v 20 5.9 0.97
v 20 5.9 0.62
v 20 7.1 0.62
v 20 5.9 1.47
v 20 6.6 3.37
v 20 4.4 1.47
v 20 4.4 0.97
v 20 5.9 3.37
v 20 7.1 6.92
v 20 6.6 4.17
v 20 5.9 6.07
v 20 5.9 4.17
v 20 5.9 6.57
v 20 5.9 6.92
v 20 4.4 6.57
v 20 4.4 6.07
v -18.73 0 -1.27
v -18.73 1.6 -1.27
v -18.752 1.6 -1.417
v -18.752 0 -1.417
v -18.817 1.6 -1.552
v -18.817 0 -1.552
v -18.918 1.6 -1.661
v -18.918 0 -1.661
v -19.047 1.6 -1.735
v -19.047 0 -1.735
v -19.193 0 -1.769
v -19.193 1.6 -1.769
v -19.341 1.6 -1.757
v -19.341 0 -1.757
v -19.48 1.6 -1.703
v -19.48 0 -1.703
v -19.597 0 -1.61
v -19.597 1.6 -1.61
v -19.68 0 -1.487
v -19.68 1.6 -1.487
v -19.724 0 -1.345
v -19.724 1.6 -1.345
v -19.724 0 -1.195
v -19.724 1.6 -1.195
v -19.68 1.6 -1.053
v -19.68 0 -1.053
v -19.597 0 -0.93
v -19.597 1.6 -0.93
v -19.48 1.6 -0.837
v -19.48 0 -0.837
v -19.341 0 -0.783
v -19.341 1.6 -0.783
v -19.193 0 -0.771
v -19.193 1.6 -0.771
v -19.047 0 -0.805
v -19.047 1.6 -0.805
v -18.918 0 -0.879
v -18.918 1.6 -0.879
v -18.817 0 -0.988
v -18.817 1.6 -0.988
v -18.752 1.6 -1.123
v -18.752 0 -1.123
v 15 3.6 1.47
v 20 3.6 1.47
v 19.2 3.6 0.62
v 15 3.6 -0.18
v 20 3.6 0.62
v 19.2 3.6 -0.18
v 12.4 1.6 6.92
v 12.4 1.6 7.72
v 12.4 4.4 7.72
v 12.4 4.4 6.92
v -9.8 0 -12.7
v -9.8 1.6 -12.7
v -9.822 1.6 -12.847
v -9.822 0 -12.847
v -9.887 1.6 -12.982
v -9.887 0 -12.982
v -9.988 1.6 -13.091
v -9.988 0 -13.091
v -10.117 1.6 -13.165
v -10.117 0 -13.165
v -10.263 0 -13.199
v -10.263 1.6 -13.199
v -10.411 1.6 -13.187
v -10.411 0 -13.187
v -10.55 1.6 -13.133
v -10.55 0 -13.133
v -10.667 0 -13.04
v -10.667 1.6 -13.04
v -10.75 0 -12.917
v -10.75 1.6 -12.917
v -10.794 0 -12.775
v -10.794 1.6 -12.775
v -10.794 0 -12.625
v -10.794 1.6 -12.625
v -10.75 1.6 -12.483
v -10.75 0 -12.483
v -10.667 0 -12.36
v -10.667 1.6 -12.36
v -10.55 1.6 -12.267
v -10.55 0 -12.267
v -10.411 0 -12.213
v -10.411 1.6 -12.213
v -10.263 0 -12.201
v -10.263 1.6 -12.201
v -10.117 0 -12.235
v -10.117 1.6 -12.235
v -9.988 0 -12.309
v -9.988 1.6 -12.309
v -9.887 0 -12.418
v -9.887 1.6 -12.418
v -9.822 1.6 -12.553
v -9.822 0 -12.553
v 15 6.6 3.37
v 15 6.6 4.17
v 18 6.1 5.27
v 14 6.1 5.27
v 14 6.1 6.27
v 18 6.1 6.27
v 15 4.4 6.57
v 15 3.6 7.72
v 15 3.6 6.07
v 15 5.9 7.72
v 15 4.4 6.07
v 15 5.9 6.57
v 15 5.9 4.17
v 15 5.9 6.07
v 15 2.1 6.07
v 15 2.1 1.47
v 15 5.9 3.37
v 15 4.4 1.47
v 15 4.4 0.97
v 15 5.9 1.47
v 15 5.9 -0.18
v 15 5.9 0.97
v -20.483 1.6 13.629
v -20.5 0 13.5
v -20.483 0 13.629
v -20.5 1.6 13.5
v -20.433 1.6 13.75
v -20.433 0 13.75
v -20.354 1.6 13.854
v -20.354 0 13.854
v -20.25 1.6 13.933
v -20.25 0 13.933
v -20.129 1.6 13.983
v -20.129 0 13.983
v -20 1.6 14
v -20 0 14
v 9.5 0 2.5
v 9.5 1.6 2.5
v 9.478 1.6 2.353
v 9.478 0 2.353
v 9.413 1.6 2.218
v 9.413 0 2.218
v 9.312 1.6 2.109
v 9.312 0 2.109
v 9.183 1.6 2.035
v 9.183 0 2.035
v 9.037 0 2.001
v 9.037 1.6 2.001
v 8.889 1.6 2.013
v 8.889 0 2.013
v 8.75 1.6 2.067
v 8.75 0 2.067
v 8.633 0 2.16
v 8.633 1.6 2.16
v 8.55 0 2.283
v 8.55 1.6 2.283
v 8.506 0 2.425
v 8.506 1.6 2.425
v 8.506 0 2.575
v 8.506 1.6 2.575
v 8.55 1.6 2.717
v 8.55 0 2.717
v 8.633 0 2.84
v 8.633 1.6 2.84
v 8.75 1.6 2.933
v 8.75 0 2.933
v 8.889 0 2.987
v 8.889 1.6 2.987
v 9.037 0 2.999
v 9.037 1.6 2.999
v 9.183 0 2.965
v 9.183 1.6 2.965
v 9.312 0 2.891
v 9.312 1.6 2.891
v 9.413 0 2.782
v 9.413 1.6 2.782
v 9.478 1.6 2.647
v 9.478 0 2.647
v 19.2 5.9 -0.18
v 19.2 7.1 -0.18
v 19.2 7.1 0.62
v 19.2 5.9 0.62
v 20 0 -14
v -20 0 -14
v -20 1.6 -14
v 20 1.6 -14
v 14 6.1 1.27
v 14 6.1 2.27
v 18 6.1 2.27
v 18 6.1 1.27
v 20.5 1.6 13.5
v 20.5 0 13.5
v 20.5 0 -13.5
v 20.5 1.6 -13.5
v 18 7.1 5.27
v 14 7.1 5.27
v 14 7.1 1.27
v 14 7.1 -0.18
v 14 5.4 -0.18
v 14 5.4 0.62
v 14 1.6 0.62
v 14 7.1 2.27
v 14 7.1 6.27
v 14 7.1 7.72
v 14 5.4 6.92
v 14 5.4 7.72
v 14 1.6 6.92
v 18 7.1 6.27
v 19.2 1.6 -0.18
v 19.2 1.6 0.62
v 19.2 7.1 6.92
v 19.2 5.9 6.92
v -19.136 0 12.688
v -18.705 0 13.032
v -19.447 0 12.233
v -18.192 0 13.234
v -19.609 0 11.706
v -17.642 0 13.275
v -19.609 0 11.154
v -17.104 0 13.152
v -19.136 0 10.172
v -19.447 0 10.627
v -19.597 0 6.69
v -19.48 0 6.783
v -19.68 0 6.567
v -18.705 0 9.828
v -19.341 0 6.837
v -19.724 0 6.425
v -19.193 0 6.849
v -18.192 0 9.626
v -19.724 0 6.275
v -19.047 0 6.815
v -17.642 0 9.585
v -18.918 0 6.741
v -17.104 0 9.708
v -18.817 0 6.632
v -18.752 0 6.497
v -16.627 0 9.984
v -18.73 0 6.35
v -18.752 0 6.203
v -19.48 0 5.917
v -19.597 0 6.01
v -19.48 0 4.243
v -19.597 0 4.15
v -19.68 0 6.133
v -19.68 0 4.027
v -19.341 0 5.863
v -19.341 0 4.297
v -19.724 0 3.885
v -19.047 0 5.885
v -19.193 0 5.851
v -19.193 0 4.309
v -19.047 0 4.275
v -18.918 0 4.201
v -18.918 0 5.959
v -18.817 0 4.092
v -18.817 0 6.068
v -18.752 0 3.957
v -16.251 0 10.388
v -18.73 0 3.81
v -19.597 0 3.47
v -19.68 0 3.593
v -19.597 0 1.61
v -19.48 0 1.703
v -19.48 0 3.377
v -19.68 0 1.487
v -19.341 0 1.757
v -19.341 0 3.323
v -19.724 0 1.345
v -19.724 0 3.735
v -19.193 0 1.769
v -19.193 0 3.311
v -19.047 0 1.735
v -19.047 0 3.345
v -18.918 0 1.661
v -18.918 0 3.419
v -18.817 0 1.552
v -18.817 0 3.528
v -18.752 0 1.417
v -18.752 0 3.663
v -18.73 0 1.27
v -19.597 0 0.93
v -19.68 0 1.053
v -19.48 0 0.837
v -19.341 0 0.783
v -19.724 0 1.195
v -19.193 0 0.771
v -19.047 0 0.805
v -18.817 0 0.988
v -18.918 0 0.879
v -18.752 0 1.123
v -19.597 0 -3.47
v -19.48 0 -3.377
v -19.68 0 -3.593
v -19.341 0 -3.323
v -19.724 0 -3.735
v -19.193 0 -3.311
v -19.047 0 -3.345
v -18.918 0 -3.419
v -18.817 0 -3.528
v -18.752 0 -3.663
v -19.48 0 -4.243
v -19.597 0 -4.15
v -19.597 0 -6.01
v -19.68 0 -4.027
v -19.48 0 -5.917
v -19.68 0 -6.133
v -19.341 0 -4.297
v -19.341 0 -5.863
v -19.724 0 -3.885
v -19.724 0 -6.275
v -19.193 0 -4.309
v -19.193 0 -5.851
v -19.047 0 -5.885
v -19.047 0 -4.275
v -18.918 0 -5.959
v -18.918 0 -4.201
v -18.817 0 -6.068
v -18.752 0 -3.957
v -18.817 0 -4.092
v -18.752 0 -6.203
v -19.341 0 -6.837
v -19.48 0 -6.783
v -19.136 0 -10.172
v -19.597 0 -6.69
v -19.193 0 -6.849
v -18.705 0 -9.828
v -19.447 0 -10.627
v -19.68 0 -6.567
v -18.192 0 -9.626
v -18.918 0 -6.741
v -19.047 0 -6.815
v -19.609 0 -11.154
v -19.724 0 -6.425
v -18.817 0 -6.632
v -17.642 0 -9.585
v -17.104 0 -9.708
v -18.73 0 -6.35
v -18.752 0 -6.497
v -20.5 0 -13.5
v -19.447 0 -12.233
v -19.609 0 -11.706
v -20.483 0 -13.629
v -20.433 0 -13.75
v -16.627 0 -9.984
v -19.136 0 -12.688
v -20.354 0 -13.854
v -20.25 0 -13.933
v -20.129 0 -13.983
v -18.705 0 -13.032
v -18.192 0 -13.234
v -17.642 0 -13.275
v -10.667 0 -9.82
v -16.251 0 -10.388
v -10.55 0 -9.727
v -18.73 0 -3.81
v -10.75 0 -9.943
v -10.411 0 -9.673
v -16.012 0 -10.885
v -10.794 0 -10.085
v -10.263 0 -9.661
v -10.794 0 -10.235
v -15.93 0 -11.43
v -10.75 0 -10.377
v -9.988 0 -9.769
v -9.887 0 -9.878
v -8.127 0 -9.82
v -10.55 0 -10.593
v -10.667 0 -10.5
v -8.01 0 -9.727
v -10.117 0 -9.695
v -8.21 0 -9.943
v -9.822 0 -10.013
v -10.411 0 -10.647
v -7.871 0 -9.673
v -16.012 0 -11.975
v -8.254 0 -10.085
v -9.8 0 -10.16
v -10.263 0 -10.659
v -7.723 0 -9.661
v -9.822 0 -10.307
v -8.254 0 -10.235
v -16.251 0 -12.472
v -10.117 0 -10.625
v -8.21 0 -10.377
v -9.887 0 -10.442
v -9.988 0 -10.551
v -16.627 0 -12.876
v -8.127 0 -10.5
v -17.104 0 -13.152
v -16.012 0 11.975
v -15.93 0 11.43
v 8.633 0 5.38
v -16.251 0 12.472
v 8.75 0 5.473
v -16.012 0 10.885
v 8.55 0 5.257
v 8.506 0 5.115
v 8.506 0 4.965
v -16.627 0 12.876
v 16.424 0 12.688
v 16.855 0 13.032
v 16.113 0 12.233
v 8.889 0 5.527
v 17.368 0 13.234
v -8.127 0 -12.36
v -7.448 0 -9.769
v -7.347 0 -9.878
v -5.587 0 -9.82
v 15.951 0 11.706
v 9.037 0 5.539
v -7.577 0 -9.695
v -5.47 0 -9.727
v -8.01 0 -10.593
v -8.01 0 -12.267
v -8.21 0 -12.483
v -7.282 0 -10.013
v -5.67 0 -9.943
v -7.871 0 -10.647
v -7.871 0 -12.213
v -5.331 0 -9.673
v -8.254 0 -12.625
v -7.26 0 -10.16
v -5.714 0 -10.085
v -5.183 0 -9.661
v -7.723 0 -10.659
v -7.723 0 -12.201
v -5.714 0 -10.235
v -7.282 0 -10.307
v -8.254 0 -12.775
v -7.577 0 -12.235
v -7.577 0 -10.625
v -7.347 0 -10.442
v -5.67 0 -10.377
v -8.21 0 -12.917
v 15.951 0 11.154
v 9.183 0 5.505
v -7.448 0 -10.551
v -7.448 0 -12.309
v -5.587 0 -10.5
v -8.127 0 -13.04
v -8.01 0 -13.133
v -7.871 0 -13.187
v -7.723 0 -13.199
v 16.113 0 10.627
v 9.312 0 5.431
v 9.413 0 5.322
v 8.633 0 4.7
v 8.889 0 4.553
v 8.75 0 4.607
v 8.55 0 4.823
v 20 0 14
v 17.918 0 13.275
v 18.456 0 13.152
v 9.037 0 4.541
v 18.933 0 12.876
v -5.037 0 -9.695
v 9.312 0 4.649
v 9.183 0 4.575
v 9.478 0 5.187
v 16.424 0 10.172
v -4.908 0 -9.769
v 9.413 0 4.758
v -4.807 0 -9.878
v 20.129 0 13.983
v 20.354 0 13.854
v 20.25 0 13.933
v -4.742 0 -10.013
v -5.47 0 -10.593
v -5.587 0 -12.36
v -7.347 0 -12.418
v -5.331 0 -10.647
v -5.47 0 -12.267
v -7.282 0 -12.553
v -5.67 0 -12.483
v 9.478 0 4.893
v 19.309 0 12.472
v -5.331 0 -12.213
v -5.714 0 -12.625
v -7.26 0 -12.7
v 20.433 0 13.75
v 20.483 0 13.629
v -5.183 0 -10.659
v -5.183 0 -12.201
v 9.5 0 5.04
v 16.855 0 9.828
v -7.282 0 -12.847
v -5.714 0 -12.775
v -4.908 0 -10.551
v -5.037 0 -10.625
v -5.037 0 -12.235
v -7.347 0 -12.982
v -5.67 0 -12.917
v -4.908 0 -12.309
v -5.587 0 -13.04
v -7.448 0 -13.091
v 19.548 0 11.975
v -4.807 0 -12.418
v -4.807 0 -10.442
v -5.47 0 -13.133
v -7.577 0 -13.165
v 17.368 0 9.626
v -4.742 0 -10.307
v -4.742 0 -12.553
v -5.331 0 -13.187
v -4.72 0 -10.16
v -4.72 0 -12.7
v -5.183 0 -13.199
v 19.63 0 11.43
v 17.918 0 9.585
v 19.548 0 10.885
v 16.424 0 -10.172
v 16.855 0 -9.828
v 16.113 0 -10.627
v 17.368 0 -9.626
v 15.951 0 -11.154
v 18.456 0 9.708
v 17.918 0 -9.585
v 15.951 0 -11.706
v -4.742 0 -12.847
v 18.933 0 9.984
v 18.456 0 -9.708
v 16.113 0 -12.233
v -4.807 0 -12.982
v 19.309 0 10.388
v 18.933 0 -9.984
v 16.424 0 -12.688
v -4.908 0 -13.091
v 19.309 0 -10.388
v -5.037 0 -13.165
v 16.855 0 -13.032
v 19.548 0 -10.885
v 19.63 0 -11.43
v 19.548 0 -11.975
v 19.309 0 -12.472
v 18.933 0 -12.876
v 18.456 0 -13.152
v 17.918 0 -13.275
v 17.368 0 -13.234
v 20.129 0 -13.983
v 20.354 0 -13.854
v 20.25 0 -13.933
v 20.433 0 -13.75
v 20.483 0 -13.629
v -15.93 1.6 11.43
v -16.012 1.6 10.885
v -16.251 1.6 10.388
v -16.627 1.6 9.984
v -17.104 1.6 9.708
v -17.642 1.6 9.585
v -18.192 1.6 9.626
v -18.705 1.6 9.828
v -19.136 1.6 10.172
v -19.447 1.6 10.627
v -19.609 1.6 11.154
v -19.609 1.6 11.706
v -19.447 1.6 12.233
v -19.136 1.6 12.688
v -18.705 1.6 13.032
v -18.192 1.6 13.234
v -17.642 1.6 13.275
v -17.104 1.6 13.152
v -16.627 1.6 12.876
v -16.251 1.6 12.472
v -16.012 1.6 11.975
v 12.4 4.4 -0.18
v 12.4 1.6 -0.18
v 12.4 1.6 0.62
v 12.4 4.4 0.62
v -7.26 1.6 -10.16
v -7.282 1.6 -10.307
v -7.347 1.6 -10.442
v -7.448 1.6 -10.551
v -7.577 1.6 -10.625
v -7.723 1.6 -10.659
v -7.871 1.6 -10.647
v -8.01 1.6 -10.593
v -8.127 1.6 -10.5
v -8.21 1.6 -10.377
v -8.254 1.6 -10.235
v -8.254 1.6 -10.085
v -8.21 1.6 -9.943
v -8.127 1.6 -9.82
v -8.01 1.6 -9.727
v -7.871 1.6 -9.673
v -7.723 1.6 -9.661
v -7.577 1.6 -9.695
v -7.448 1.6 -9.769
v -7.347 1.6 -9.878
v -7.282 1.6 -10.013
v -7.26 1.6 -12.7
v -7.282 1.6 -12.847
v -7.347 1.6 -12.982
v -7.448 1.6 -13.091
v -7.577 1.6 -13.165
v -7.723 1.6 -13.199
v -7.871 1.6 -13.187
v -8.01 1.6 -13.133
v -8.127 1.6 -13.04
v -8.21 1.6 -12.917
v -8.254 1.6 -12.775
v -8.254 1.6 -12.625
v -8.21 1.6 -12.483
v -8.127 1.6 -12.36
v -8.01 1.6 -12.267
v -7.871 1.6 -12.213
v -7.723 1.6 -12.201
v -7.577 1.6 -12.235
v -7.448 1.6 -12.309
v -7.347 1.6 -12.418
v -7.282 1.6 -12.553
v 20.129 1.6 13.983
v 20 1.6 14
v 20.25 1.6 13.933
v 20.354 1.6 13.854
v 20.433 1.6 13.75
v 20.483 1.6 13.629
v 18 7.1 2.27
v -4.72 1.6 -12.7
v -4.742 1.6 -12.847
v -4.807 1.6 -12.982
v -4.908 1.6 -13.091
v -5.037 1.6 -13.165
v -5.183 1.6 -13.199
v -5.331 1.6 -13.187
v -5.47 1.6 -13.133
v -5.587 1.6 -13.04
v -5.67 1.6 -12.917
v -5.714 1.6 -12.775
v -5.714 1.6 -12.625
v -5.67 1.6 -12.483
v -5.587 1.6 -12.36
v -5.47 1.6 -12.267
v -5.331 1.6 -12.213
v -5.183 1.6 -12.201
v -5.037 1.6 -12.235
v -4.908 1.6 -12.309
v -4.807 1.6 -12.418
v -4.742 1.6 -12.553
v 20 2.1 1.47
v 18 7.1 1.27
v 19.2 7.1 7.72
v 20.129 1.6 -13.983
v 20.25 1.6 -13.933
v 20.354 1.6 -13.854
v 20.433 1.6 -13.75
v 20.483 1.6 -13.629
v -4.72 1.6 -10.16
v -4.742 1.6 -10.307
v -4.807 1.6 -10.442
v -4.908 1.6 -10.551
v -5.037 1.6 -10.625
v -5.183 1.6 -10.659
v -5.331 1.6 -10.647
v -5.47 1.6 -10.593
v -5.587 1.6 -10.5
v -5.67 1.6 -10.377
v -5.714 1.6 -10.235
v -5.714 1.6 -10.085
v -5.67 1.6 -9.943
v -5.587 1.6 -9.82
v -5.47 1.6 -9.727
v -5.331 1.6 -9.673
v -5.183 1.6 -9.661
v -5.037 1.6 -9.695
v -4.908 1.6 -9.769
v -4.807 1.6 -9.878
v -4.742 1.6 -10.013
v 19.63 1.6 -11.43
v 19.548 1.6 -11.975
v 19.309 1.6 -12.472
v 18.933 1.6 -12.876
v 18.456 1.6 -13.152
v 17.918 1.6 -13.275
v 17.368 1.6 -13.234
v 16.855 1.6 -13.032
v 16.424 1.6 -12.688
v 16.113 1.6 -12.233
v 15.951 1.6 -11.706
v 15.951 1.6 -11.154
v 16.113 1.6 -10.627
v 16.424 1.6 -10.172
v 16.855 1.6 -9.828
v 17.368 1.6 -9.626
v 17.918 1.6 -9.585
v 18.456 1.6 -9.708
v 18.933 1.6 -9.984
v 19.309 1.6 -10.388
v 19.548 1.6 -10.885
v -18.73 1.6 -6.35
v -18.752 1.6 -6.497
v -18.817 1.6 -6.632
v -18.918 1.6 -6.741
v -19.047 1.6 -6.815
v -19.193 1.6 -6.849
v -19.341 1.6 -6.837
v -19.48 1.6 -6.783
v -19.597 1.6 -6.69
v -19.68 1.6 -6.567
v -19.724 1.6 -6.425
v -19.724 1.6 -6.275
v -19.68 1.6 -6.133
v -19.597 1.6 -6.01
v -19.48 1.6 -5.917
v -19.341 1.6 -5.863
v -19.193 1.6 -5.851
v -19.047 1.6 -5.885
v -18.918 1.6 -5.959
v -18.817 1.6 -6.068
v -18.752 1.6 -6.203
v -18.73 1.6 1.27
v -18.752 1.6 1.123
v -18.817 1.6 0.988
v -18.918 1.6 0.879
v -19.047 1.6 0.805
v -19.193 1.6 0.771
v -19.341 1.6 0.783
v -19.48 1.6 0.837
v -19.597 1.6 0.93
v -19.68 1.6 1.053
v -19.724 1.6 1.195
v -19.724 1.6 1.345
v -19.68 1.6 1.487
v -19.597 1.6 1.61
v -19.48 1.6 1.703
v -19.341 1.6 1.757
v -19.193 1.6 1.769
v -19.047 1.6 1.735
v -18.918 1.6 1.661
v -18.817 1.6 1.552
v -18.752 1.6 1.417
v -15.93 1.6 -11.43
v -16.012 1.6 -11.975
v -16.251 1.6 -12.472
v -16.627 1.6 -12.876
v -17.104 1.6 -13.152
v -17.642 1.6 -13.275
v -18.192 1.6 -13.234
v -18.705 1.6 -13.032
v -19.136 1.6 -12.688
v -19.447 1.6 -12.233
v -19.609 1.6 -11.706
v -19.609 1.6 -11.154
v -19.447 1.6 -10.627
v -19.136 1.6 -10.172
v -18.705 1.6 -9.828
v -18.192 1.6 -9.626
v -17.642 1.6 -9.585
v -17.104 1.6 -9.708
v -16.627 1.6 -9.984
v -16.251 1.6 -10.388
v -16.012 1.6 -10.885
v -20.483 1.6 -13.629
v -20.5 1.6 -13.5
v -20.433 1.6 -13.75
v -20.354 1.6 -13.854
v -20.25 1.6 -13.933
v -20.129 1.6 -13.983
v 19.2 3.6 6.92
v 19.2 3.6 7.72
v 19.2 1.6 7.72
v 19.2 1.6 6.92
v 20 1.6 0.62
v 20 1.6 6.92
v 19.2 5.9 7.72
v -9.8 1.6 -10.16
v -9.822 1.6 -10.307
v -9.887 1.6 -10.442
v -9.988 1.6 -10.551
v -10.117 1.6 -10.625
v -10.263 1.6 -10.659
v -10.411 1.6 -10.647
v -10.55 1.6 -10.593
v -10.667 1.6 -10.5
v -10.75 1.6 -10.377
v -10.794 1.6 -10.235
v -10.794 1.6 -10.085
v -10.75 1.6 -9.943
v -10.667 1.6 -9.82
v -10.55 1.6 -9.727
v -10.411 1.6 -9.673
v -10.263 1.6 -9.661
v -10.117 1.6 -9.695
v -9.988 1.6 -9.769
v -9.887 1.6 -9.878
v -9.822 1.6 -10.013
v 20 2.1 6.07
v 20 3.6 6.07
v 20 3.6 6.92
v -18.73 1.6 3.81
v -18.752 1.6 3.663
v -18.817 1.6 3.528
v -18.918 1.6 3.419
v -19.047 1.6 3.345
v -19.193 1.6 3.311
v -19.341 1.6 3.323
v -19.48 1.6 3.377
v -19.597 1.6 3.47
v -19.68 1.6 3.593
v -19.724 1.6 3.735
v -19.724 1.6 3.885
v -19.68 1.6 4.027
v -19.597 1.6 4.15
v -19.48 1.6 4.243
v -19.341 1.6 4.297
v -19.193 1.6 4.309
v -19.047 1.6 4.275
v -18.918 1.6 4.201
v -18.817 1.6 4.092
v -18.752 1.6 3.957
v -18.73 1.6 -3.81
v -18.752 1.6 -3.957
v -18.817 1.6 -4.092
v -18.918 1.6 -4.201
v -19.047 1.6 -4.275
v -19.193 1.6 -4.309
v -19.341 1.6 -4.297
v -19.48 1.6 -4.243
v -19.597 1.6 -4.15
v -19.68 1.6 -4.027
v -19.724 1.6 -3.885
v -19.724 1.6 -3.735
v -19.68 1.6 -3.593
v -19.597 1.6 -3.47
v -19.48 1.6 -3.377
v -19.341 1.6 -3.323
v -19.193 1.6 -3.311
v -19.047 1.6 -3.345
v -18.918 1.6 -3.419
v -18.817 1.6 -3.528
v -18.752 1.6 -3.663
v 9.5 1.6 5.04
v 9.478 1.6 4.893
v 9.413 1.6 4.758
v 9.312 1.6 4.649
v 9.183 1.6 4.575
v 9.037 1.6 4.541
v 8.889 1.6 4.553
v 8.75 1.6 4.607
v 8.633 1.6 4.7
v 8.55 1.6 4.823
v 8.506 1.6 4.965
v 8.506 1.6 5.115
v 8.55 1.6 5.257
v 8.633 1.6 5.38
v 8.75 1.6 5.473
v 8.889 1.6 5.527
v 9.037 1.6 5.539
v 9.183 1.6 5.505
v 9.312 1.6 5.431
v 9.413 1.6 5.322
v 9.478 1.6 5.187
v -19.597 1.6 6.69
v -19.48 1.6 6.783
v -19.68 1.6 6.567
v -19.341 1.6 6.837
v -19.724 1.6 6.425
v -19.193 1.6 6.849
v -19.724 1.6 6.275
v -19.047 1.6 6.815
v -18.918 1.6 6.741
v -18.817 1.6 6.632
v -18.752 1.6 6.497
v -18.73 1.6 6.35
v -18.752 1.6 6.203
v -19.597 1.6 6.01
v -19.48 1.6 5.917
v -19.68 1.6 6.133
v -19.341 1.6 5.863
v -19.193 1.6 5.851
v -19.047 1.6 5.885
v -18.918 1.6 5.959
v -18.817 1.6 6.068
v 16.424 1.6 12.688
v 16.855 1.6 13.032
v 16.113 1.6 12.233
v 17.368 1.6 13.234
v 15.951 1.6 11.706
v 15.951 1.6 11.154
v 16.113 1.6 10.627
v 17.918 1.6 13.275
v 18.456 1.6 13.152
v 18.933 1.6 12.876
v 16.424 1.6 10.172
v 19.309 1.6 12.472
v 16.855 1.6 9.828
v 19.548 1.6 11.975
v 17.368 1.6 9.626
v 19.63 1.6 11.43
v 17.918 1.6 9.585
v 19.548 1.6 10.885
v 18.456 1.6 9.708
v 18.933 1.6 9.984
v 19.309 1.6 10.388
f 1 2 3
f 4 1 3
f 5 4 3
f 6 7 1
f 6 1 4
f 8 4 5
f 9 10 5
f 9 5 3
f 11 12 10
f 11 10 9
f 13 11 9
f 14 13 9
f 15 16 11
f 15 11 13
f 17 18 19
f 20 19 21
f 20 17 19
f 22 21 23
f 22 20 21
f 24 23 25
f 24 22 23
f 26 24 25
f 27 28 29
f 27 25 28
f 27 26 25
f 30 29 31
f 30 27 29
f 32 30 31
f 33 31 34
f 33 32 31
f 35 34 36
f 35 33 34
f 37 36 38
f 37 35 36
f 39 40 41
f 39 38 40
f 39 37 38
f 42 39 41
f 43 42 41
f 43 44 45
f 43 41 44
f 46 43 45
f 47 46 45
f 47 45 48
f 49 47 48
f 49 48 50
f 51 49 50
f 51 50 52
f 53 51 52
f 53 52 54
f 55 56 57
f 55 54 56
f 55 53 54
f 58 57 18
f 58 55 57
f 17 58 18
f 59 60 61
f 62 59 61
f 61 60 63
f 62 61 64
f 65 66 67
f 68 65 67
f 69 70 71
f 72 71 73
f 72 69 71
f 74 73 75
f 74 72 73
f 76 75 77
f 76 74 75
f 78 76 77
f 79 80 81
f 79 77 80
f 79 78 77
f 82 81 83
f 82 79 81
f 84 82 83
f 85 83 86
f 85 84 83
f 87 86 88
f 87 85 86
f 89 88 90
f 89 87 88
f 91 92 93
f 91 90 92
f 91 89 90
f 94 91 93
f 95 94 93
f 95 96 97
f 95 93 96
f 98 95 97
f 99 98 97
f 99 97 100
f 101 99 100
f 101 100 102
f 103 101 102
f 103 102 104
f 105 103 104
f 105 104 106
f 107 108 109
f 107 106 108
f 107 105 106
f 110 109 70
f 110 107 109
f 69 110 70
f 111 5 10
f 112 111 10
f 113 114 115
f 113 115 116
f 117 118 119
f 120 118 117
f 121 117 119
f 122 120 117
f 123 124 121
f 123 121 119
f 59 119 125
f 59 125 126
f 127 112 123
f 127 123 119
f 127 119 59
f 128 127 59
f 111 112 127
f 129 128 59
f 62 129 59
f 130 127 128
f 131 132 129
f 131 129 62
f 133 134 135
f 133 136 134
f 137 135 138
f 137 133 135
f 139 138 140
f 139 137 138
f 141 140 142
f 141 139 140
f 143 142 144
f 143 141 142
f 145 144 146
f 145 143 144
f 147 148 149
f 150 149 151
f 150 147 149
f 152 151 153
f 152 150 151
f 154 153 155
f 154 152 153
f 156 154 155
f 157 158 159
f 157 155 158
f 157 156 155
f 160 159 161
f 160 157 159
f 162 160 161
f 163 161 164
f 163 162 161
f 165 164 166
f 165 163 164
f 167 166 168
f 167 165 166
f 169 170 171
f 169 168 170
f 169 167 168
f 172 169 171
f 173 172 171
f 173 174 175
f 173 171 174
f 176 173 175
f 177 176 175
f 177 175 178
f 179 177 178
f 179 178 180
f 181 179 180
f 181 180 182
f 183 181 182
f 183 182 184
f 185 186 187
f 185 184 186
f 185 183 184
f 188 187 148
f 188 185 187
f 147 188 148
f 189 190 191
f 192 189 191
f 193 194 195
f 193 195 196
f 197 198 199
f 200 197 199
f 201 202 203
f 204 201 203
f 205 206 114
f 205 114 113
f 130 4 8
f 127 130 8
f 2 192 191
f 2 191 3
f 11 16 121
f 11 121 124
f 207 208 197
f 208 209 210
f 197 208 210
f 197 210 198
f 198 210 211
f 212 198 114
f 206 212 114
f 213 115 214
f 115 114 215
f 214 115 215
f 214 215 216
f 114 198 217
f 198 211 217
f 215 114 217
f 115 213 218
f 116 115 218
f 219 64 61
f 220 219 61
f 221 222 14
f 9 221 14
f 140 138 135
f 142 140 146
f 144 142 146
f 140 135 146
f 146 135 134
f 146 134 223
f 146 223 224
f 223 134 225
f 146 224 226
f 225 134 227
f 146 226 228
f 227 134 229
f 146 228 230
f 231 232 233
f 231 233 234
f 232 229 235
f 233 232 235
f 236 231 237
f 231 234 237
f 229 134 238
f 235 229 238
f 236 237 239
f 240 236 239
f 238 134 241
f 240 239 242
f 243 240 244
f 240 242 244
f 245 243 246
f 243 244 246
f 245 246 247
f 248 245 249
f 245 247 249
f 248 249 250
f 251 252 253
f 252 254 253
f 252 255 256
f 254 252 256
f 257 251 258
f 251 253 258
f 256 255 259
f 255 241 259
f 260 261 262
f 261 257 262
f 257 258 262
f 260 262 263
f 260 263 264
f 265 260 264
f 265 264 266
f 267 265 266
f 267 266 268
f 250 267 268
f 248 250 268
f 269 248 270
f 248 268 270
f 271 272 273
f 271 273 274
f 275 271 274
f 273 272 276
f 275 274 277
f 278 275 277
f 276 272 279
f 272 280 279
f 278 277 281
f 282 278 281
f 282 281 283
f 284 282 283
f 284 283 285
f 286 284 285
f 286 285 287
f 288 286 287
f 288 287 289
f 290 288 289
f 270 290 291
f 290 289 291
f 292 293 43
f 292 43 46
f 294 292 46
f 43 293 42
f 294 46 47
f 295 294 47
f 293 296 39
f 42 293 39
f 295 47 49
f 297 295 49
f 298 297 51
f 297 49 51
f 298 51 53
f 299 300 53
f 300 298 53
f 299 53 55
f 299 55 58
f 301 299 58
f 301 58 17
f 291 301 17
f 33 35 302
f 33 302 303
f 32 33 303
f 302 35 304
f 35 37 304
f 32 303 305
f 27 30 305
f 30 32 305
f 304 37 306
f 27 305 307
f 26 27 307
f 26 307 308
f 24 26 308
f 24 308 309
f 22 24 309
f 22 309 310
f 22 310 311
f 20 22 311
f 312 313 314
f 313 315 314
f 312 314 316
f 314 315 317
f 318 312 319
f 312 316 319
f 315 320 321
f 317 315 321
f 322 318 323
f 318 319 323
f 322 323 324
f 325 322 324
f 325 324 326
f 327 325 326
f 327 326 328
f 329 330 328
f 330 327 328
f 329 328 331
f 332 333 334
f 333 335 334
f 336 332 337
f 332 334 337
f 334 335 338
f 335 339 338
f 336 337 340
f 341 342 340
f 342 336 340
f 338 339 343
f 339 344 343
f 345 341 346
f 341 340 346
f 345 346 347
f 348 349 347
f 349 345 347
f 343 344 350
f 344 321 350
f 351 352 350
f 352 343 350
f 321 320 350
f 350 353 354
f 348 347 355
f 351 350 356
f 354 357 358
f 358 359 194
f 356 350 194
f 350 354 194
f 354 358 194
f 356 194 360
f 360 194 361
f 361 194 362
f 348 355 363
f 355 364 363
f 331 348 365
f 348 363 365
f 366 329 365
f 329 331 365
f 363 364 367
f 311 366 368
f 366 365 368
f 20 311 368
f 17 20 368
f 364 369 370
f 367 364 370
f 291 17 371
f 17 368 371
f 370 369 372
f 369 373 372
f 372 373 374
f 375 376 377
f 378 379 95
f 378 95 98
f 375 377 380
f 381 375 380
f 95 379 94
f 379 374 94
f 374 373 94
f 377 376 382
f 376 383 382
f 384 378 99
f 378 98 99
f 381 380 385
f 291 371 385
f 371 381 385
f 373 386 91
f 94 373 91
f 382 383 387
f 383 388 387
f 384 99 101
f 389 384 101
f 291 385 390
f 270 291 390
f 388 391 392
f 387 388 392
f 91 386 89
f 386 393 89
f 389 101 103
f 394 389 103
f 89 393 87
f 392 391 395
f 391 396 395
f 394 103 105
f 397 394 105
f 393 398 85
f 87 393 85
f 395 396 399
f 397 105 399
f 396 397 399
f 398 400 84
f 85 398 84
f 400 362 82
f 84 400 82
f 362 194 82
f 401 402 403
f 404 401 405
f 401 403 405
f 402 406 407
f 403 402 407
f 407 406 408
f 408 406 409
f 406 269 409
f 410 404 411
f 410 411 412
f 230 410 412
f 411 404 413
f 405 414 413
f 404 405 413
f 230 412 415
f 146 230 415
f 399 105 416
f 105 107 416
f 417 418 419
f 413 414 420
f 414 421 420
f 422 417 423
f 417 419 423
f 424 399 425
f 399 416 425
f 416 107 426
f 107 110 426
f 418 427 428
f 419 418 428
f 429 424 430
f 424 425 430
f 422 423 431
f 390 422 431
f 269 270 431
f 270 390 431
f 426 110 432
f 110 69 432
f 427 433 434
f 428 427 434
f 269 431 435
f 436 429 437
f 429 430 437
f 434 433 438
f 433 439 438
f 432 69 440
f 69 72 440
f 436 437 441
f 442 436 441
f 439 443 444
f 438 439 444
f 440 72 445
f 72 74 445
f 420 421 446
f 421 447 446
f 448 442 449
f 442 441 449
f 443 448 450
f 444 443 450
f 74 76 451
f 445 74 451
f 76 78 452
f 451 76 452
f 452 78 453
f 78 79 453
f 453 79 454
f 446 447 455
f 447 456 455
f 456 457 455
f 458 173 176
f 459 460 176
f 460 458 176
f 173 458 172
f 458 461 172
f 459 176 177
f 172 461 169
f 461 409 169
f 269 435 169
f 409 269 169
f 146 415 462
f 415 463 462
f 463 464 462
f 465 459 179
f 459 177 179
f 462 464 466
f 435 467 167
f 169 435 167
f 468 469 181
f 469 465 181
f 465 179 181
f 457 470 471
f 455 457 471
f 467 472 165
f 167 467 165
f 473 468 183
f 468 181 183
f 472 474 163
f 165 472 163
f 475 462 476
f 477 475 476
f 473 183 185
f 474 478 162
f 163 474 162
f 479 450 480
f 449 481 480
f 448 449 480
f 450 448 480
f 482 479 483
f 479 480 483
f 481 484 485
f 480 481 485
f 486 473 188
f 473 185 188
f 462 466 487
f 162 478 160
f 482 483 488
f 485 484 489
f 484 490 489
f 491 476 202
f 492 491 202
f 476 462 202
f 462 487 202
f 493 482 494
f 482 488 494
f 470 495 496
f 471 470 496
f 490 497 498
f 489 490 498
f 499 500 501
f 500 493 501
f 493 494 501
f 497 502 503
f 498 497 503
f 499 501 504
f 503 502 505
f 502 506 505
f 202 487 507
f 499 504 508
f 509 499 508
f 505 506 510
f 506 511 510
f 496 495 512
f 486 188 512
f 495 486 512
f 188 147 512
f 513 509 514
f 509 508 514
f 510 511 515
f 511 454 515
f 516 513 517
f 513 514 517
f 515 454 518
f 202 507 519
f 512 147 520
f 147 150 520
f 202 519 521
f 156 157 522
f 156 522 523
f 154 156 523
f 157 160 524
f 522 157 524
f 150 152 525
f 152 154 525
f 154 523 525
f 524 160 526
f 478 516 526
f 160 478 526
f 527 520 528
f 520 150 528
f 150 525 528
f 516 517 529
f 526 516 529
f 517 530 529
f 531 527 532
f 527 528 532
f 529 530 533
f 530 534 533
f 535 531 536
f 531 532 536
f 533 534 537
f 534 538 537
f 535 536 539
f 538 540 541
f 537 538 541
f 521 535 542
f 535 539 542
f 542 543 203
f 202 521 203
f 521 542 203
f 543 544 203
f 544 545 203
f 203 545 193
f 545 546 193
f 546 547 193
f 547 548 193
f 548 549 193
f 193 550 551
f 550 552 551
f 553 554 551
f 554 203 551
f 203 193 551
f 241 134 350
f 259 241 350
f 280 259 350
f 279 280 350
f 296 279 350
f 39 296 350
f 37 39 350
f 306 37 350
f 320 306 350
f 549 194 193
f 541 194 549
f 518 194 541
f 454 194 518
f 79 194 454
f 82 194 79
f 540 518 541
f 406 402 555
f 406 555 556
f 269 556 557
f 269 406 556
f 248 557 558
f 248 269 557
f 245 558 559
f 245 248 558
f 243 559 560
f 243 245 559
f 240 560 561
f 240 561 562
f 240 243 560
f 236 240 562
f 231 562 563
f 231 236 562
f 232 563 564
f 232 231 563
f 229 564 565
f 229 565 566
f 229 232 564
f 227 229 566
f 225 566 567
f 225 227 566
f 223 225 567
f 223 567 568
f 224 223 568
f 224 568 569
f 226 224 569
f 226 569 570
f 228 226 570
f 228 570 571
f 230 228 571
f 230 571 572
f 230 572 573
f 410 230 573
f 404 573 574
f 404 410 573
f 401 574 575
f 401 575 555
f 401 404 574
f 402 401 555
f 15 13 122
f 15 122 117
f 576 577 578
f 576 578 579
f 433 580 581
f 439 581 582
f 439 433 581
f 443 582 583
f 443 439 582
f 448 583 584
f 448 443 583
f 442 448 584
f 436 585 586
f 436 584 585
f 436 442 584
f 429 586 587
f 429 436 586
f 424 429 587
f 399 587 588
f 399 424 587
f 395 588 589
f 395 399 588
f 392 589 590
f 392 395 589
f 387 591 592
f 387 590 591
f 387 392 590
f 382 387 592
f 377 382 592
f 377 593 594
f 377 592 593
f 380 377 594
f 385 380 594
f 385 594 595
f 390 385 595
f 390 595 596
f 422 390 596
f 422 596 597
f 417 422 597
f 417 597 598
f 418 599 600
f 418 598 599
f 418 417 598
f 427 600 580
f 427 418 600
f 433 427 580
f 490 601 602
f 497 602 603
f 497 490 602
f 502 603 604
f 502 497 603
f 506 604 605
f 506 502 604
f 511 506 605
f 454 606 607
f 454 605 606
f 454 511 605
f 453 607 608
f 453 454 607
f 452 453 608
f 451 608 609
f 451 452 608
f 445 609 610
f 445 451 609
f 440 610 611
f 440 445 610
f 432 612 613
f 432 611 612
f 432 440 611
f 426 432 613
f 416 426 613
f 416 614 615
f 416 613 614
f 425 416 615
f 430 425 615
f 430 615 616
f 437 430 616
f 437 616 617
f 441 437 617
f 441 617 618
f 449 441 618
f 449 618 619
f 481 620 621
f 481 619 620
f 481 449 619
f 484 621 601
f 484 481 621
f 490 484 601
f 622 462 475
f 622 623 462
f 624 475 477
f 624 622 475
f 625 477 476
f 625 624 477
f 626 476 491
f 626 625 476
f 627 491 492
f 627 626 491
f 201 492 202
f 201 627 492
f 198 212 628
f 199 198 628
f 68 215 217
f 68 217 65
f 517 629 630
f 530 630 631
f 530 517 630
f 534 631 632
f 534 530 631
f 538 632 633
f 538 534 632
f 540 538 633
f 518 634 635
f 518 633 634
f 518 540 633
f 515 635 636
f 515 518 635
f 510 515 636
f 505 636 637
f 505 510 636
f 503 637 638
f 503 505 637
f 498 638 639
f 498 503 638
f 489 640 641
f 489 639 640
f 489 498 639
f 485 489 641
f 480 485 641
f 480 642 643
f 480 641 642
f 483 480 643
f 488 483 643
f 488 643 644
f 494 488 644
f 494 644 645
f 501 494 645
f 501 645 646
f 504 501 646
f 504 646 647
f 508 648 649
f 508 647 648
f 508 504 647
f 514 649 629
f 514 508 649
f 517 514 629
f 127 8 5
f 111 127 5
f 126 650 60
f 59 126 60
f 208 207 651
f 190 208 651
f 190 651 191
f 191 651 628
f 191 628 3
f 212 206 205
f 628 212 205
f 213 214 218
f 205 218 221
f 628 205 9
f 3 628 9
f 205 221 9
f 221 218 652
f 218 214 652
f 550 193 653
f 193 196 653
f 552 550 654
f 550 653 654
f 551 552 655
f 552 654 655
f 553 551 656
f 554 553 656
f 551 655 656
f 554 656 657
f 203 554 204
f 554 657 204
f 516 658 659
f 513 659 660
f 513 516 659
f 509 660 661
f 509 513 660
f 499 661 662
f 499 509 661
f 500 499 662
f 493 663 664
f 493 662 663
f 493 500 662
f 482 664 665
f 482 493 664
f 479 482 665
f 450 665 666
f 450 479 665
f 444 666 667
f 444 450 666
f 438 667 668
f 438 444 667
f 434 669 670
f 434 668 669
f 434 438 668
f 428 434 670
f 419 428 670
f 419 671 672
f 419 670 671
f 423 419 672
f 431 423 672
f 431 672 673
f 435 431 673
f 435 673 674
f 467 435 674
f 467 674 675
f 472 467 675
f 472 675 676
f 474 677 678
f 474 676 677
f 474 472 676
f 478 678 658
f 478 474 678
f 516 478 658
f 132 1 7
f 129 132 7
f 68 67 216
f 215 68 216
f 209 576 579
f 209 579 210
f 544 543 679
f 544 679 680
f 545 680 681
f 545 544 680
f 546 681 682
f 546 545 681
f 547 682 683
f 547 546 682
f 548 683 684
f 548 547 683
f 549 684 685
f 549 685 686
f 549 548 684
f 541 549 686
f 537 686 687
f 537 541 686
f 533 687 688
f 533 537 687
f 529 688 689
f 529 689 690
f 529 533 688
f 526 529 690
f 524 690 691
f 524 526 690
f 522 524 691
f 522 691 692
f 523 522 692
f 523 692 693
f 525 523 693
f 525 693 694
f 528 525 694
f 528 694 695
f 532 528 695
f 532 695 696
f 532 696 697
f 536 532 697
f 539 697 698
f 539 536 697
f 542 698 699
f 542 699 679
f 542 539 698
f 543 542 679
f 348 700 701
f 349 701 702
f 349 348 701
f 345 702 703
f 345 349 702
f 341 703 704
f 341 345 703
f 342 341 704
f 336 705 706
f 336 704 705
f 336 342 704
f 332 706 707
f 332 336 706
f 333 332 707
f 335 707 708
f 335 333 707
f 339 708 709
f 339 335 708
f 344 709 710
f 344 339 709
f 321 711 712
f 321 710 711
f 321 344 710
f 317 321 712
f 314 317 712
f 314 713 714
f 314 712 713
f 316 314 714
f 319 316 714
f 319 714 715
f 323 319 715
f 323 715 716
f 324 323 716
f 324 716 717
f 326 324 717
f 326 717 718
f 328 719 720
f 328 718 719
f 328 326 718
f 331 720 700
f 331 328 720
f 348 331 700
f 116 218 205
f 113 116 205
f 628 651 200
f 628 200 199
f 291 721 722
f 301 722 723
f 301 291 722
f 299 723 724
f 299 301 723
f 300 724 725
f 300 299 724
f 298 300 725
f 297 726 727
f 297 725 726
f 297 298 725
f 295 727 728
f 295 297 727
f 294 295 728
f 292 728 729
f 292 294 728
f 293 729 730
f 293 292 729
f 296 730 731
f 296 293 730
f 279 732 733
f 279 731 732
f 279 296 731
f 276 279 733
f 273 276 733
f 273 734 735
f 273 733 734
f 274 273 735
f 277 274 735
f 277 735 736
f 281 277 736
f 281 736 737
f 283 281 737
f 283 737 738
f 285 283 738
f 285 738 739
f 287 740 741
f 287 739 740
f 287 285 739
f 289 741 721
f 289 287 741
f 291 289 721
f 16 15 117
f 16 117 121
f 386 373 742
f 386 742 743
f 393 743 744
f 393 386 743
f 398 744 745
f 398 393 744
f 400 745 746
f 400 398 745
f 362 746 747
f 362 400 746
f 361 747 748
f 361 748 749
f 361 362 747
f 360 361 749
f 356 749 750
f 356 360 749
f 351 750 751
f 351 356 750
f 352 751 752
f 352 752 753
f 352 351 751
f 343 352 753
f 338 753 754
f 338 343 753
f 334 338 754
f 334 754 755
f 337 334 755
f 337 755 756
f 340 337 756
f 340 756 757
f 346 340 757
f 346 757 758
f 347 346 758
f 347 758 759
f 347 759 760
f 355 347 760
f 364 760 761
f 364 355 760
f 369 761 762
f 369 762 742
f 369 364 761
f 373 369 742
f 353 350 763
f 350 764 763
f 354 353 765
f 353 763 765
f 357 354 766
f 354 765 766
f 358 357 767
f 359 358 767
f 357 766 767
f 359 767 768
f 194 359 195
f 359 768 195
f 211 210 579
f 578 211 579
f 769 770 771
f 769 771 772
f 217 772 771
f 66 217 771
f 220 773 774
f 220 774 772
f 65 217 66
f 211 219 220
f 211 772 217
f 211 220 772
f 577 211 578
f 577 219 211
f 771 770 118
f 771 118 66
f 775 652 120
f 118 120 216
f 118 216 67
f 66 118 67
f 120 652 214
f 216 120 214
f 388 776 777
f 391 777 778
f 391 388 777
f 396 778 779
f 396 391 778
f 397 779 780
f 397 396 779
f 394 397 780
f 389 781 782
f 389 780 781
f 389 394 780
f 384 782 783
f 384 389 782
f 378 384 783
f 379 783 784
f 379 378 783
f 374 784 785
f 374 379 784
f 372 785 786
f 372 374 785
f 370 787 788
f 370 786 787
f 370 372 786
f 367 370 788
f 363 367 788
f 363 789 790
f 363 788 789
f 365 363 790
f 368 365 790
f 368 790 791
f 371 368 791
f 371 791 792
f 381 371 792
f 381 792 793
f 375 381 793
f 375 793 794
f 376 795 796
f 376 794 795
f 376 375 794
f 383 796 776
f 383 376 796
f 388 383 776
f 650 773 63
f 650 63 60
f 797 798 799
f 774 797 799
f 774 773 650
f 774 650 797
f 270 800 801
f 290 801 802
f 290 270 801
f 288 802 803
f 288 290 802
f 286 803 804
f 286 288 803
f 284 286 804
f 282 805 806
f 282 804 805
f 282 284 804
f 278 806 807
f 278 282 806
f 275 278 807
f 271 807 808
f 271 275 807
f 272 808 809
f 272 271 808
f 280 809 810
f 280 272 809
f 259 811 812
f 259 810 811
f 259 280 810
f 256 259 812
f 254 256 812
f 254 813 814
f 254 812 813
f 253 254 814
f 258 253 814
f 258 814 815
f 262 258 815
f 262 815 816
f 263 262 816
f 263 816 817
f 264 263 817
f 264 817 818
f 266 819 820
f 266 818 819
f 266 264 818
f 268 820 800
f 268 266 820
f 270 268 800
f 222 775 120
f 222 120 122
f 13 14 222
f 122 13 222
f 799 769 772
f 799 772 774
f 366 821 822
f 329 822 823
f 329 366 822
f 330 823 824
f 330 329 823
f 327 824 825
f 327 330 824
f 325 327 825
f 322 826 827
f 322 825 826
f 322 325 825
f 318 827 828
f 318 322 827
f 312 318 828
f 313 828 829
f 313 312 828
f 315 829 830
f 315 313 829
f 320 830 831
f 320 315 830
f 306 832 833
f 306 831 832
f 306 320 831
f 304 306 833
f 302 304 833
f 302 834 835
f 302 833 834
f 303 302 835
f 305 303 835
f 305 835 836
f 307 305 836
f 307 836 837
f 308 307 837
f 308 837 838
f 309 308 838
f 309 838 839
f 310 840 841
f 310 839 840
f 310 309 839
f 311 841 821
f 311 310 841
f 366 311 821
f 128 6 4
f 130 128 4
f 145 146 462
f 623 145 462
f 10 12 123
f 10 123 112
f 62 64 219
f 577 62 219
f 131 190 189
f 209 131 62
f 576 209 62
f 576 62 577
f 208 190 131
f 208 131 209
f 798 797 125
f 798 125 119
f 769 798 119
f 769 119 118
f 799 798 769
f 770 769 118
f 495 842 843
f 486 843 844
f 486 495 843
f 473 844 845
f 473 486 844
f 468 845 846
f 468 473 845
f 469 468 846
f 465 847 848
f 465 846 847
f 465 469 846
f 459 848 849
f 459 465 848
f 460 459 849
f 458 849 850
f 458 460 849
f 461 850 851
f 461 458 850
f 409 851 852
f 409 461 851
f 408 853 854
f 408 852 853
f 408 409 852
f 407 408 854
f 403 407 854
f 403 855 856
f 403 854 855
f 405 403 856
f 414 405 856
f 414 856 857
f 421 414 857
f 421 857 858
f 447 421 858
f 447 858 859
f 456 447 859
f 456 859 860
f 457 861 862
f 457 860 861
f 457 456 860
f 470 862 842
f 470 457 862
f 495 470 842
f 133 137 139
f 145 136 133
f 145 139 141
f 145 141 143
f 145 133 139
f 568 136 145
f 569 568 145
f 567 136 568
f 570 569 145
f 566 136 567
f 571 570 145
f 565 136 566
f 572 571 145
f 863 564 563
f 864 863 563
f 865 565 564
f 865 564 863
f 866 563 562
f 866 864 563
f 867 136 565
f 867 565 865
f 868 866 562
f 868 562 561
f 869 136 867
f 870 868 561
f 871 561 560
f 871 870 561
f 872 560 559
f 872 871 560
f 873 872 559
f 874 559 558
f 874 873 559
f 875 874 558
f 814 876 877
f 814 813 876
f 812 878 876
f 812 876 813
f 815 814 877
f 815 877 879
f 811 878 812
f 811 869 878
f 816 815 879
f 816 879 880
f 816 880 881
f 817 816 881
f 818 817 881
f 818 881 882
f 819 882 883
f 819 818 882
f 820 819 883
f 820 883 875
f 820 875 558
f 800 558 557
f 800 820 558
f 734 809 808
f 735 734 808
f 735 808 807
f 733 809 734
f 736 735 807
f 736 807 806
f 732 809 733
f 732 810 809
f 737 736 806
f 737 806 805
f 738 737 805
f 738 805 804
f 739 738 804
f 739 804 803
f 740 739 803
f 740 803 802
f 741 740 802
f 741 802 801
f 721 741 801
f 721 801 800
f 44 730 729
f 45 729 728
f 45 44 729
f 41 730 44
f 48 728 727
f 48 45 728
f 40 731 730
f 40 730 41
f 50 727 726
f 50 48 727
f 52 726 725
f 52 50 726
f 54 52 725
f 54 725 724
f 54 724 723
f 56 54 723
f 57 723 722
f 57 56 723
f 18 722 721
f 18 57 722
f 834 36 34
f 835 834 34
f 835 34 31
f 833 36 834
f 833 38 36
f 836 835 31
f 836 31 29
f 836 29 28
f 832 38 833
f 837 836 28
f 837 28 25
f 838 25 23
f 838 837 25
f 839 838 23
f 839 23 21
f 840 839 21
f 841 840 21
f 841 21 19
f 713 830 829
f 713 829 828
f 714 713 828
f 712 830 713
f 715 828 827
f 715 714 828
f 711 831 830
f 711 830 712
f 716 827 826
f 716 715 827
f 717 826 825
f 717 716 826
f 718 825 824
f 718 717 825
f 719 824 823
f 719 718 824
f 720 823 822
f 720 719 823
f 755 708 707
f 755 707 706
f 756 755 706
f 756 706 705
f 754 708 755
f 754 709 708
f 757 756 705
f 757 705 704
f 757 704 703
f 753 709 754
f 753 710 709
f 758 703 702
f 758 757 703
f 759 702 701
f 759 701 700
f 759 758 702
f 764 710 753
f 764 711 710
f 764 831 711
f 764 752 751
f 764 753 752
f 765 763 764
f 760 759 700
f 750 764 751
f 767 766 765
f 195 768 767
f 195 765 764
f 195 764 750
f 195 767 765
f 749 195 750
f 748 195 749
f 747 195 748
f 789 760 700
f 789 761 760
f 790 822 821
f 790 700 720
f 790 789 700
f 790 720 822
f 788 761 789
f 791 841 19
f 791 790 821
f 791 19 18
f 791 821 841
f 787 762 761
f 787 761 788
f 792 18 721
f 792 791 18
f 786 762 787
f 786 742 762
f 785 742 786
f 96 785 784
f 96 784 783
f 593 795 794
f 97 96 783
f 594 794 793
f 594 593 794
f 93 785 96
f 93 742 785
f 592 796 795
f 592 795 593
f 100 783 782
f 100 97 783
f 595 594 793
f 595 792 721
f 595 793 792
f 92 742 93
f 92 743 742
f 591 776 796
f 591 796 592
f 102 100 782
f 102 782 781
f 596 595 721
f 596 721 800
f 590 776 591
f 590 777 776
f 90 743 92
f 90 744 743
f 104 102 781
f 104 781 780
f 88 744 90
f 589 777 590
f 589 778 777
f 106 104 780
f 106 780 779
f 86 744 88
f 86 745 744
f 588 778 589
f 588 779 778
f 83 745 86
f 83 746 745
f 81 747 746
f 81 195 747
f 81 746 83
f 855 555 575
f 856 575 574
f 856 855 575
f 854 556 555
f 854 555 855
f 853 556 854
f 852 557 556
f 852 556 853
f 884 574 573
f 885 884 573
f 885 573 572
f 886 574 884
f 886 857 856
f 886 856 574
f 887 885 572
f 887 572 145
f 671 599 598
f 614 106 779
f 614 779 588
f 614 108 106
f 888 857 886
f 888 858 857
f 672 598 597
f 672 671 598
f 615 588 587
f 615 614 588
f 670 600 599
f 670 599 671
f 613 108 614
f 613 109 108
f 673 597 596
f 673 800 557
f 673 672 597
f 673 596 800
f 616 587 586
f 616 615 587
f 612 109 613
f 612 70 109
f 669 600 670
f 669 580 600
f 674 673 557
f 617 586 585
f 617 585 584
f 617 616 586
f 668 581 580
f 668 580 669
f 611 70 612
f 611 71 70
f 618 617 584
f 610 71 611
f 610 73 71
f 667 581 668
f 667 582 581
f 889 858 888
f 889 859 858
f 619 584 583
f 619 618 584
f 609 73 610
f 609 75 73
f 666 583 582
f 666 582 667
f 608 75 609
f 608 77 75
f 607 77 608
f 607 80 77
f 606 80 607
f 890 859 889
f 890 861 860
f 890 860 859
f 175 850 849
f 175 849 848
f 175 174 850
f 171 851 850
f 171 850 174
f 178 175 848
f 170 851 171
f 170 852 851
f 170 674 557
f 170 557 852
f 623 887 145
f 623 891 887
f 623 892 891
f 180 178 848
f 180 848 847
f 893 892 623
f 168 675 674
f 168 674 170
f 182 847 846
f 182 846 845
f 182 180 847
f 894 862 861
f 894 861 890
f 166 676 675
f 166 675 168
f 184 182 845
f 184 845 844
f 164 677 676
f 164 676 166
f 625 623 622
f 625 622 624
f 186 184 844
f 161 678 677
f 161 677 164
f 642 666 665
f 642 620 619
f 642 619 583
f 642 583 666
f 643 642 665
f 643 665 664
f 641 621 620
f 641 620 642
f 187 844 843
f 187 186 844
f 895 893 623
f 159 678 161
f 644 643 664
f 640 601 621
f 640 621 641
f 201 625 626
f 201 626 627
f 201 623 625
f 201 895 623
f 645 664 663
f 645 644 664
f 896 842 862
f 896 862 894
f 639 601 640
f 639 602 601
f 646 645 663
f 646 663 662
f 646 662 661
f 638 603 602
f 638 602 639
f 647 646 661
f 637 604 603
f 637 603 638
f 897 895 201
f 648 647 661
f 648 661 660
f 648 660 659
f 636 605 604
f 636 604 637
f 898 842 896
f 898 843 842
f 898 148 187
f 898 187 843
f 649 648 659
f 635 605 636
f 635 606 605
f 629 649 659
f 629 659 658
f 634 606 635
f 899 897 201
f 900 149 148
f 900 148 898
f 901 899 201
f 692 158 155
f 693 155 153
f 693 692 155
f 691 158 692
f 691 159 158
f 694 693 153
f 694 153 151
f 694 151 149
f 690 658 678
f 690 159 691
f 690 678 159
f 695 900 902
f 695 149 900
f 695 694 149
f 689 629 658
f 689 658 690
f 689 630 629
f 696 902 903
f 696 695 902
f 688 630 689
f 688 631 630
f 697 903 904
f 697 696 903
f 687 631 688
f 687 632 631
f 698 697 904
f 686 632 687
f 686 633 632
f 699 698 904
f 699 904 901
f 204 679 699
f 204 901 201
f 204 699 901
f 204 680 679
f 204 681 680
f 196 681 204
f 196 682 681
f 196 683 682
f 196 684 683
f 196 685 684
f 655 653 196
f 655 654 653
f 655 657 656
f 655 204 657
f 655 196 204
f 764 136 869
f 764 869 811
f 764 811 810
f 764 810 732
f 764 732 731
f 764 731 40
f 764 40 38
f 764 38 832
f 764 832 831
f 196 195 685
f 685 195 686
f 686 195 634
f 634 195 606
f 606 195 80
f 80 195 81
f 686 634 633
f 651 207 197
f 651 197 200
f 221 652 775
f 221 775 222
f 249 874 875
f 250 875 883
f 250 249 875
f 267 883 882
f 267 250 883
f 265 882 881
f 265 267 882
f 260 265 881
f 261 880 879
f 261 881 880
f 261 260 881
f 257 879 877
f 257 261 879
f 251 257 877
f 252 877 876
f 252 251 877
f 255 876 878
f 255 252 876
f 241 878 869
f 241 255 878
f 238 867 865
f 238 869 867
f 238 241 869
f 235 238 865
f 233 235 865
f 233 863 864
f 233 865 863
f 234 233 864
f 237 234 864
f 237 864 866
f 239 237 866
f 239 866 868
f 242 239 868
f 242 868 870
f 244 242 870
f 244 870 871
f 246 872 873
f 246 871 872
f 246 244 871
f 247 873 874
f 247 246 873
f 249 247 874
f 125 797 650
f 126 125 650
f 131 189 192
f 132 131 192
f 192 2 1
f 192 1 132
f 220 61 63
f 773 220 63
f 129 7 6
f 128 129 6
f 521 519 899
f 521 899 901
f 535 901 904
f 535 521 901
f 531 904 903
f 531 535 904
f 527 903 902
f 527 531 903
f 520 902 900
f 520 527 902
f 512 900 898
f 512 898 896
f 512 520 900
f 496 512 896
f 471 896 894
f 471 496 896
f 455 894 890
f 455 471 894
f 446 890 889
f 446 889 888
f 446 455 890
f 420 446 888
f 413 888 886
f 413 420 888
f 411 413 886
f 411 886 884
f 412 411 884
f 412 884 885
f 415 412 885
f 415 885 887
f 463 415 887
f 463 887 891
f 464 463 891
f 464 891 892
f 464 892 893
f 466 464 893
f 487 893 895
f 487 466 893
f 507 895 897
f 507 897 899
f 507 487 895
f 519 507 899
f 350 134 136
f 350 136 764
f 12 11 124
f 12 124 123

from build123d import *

# Parameters (mm, degrees)
SKETCH1_W           = 41
SKETCH1_H           = 28
SKETCH1_R           = 1.85
BOARD_DEPTH         = 1.6
SKETCH4_R           = 0.5
HOLES_DEPTH         = 2.6
FILLET1_R           = 0.5
SKETCH5_W           = 6
SKETCH5_H           = 3.95
BOSS_EXTRUDE2_DEPTH = 5.5
BOSS_EXTRUDE3_DEPTH = 0.8
CUT_EXTRUDE2_DEPTH  = 5
SKETCH7_W           = 4
SKETCH7_H           = 1
CUT_EXTRUDE3_DEPTH  = 1
SKETCH9_W           = 0.8
SKETCH9_H           = 0.8
CUT_EXTRUDE4_DEPTH  = 8.1


with BuildPart() as part:
    # Sketch1 → board (new body)
    with BuildSketch(Plane(origin=(0, 0, 0), x_dir=(1, 0, 0), z_dir=(0, 1, 0))):
        Rectangle(SKETCH1_W, SKETCH1_H)
        with Locations((-17.78, 11.43)):
            Circle(SKETCH1_R, mode=Mode.SUBTRACT)
        with Locations((-17.78, -11.43)):
            Circle(SKETCH1_R, mode=Mode.SUBTRACT)
        with Locations((17.78, -11.43)):
            Circle(SKETCH1_R, mode=Mode.SUBTRACT)
        with Locations((17.78, 11.43)):
            Circle(SKETCH1_R, mode=Mode.SUBTRACT)
    extrude(amount=BOARD_DEPTH)

    # Sketch4 → holes (cut, through all)
    with BuildSketch(Plane(origin=(0, 0, 0), x_dir=(1, 0, 0), z_dir=(0, 1, 0))):
        with Locations((-19.23, -6.35)):
            Circle(SKETCH4_R)
        with Locations((-19.23, -3.81)):
            Circle(SKETCH4_R)
        with Locations((-19.23, -1.27)):
            Circle(SKETCH4_R)
        with Locations((-19.23, 1.27)):
            Circle(SKETCH4_R)
        with Locations((-19.23, 3.81)):
            Circle(SKETCH4_R)
        with Locations((-19.23, 6.35)):
            Circle(SKETCH4_R)
        with Locations((-5.22, 10.16)):
            Circle(SKETCH4_R)
        with Locations((-7.76, 10.16)):
            Circle(SKETCH4_R)
        with Locations((-5.22, 12.7)):
            Circle(SKETCH4_R)
        with Locations((-7.76, 12.7)):
            Circle(SKETCH4_R)
        with Locations((-10.3, 12.7)):
            Circle(SKETCH4_R)
        with Locations((9, -5.04)):
            Circle(SKETCH4_R)
        with Locations((9, -2.5)):
            Circle(SKETCH4_R)
        with Locations((-10.3, 10.16)):
            Circle(SKETCH4_R)
    extrude(amount=HOLES_DEPTH, mode=Mode.SUBTRACT)

    # Fillet1
    fillet1_edges = [part.edges().sort_by_distance(p)[0] for p in [
        (20.5, 0.8, -14),
        (20.5, 0.8, 14),
        (-20.5, 0.8, 14),
        (-20.5, 0.8, -14),
    ]]
    fillet(fillet1_edges, radius=FILLET1_R)


with BuildPart() as body_2:
    # Sketch5 → Boss-Extrude2 (new body)
    with BuildSketch(Plane(origin=(0, 1.6, 0), x_dir=(1, 0, 0), z_dir=(0, 1, 0))):
        with Locations((17, -5.745)):
            Rectangle(SKETCH5_W, SKETCH5_H)
    extrude(amount=BOSS_EXTRUDE2_DEPTH)

    # Sketch8 → Boss-Extrude3 (add)
    with BuildSketch(Plane.XY.offset(7.72)):
        Polygon((12.4, 1.6), (12.4, 4.4), (14, 5.4), (14, 1.6), align=None)
    extrude(amount=-BOSS_EXTRUDE3_DEPTH)

    # Sketch6 → Cut-Extrude2 (cut)
    with BuildSketch(Plane(origin=(20, 0, 0), x_dir=(0, 0, -1), z_dir=(1, 0, 0))):
        Polygon((-6.07, 5.9), (-4.17, 5.9), (-4.17, 6.6), (-3.77, 6.6), (-3.77, 2.1), (-6.07, 2.1), (-6.07, 3.6), (-7.72, 3.6), (-7.72, 5.9), (-6.57, 5.9), (-6.57, 4.4), (-6.07, 4.4), align=None)
    extrude(amount=-CUT_EXTRUDE2_DEPTH, mode=Mode.SUBTRACT)

    # Sketch7 → Cut-Extrude3 (cut)
    with BuildSketch(Plane(origin=(0, 7.1, 0), x_dir=(1, 0, 0), z_dir=(0, 1, 0))):
        with Locations((16, -5.77)):
            Rectangle(SKETCH7_W, SKETCH7_H)
    extrude(amount=-CUT_EXTRUDE3_DEPTH, mode=Mode.SUBTRACT)

    # Sketch9 → Cut-Extrude4 (cut, through all)
    with BuildSketch(Plane(origin=(0, 7.1, 0), x_dir=(1, 0, 0), z_dir=(0, 1, 0))):
        with Locations((19.6, -7.32)):
            Rectangle(SKETCH9_W, SKETCH9_H)
    extrude(amount=-CUT_EXTRUDE4_DEPTH, mode=Mode.SUBTRACT)

    # Mirror1: body 2 across plane


with BuildPart() as body_2_1:
    add(body_2.part)
    add(body_2.part.mirror(Plane(origin=(14, 7.1, 3.77), x_dir=(1, 0, 0), z_dir=(0, 0, 1))))


solid = Compound([part.part, body_2_1.part])
